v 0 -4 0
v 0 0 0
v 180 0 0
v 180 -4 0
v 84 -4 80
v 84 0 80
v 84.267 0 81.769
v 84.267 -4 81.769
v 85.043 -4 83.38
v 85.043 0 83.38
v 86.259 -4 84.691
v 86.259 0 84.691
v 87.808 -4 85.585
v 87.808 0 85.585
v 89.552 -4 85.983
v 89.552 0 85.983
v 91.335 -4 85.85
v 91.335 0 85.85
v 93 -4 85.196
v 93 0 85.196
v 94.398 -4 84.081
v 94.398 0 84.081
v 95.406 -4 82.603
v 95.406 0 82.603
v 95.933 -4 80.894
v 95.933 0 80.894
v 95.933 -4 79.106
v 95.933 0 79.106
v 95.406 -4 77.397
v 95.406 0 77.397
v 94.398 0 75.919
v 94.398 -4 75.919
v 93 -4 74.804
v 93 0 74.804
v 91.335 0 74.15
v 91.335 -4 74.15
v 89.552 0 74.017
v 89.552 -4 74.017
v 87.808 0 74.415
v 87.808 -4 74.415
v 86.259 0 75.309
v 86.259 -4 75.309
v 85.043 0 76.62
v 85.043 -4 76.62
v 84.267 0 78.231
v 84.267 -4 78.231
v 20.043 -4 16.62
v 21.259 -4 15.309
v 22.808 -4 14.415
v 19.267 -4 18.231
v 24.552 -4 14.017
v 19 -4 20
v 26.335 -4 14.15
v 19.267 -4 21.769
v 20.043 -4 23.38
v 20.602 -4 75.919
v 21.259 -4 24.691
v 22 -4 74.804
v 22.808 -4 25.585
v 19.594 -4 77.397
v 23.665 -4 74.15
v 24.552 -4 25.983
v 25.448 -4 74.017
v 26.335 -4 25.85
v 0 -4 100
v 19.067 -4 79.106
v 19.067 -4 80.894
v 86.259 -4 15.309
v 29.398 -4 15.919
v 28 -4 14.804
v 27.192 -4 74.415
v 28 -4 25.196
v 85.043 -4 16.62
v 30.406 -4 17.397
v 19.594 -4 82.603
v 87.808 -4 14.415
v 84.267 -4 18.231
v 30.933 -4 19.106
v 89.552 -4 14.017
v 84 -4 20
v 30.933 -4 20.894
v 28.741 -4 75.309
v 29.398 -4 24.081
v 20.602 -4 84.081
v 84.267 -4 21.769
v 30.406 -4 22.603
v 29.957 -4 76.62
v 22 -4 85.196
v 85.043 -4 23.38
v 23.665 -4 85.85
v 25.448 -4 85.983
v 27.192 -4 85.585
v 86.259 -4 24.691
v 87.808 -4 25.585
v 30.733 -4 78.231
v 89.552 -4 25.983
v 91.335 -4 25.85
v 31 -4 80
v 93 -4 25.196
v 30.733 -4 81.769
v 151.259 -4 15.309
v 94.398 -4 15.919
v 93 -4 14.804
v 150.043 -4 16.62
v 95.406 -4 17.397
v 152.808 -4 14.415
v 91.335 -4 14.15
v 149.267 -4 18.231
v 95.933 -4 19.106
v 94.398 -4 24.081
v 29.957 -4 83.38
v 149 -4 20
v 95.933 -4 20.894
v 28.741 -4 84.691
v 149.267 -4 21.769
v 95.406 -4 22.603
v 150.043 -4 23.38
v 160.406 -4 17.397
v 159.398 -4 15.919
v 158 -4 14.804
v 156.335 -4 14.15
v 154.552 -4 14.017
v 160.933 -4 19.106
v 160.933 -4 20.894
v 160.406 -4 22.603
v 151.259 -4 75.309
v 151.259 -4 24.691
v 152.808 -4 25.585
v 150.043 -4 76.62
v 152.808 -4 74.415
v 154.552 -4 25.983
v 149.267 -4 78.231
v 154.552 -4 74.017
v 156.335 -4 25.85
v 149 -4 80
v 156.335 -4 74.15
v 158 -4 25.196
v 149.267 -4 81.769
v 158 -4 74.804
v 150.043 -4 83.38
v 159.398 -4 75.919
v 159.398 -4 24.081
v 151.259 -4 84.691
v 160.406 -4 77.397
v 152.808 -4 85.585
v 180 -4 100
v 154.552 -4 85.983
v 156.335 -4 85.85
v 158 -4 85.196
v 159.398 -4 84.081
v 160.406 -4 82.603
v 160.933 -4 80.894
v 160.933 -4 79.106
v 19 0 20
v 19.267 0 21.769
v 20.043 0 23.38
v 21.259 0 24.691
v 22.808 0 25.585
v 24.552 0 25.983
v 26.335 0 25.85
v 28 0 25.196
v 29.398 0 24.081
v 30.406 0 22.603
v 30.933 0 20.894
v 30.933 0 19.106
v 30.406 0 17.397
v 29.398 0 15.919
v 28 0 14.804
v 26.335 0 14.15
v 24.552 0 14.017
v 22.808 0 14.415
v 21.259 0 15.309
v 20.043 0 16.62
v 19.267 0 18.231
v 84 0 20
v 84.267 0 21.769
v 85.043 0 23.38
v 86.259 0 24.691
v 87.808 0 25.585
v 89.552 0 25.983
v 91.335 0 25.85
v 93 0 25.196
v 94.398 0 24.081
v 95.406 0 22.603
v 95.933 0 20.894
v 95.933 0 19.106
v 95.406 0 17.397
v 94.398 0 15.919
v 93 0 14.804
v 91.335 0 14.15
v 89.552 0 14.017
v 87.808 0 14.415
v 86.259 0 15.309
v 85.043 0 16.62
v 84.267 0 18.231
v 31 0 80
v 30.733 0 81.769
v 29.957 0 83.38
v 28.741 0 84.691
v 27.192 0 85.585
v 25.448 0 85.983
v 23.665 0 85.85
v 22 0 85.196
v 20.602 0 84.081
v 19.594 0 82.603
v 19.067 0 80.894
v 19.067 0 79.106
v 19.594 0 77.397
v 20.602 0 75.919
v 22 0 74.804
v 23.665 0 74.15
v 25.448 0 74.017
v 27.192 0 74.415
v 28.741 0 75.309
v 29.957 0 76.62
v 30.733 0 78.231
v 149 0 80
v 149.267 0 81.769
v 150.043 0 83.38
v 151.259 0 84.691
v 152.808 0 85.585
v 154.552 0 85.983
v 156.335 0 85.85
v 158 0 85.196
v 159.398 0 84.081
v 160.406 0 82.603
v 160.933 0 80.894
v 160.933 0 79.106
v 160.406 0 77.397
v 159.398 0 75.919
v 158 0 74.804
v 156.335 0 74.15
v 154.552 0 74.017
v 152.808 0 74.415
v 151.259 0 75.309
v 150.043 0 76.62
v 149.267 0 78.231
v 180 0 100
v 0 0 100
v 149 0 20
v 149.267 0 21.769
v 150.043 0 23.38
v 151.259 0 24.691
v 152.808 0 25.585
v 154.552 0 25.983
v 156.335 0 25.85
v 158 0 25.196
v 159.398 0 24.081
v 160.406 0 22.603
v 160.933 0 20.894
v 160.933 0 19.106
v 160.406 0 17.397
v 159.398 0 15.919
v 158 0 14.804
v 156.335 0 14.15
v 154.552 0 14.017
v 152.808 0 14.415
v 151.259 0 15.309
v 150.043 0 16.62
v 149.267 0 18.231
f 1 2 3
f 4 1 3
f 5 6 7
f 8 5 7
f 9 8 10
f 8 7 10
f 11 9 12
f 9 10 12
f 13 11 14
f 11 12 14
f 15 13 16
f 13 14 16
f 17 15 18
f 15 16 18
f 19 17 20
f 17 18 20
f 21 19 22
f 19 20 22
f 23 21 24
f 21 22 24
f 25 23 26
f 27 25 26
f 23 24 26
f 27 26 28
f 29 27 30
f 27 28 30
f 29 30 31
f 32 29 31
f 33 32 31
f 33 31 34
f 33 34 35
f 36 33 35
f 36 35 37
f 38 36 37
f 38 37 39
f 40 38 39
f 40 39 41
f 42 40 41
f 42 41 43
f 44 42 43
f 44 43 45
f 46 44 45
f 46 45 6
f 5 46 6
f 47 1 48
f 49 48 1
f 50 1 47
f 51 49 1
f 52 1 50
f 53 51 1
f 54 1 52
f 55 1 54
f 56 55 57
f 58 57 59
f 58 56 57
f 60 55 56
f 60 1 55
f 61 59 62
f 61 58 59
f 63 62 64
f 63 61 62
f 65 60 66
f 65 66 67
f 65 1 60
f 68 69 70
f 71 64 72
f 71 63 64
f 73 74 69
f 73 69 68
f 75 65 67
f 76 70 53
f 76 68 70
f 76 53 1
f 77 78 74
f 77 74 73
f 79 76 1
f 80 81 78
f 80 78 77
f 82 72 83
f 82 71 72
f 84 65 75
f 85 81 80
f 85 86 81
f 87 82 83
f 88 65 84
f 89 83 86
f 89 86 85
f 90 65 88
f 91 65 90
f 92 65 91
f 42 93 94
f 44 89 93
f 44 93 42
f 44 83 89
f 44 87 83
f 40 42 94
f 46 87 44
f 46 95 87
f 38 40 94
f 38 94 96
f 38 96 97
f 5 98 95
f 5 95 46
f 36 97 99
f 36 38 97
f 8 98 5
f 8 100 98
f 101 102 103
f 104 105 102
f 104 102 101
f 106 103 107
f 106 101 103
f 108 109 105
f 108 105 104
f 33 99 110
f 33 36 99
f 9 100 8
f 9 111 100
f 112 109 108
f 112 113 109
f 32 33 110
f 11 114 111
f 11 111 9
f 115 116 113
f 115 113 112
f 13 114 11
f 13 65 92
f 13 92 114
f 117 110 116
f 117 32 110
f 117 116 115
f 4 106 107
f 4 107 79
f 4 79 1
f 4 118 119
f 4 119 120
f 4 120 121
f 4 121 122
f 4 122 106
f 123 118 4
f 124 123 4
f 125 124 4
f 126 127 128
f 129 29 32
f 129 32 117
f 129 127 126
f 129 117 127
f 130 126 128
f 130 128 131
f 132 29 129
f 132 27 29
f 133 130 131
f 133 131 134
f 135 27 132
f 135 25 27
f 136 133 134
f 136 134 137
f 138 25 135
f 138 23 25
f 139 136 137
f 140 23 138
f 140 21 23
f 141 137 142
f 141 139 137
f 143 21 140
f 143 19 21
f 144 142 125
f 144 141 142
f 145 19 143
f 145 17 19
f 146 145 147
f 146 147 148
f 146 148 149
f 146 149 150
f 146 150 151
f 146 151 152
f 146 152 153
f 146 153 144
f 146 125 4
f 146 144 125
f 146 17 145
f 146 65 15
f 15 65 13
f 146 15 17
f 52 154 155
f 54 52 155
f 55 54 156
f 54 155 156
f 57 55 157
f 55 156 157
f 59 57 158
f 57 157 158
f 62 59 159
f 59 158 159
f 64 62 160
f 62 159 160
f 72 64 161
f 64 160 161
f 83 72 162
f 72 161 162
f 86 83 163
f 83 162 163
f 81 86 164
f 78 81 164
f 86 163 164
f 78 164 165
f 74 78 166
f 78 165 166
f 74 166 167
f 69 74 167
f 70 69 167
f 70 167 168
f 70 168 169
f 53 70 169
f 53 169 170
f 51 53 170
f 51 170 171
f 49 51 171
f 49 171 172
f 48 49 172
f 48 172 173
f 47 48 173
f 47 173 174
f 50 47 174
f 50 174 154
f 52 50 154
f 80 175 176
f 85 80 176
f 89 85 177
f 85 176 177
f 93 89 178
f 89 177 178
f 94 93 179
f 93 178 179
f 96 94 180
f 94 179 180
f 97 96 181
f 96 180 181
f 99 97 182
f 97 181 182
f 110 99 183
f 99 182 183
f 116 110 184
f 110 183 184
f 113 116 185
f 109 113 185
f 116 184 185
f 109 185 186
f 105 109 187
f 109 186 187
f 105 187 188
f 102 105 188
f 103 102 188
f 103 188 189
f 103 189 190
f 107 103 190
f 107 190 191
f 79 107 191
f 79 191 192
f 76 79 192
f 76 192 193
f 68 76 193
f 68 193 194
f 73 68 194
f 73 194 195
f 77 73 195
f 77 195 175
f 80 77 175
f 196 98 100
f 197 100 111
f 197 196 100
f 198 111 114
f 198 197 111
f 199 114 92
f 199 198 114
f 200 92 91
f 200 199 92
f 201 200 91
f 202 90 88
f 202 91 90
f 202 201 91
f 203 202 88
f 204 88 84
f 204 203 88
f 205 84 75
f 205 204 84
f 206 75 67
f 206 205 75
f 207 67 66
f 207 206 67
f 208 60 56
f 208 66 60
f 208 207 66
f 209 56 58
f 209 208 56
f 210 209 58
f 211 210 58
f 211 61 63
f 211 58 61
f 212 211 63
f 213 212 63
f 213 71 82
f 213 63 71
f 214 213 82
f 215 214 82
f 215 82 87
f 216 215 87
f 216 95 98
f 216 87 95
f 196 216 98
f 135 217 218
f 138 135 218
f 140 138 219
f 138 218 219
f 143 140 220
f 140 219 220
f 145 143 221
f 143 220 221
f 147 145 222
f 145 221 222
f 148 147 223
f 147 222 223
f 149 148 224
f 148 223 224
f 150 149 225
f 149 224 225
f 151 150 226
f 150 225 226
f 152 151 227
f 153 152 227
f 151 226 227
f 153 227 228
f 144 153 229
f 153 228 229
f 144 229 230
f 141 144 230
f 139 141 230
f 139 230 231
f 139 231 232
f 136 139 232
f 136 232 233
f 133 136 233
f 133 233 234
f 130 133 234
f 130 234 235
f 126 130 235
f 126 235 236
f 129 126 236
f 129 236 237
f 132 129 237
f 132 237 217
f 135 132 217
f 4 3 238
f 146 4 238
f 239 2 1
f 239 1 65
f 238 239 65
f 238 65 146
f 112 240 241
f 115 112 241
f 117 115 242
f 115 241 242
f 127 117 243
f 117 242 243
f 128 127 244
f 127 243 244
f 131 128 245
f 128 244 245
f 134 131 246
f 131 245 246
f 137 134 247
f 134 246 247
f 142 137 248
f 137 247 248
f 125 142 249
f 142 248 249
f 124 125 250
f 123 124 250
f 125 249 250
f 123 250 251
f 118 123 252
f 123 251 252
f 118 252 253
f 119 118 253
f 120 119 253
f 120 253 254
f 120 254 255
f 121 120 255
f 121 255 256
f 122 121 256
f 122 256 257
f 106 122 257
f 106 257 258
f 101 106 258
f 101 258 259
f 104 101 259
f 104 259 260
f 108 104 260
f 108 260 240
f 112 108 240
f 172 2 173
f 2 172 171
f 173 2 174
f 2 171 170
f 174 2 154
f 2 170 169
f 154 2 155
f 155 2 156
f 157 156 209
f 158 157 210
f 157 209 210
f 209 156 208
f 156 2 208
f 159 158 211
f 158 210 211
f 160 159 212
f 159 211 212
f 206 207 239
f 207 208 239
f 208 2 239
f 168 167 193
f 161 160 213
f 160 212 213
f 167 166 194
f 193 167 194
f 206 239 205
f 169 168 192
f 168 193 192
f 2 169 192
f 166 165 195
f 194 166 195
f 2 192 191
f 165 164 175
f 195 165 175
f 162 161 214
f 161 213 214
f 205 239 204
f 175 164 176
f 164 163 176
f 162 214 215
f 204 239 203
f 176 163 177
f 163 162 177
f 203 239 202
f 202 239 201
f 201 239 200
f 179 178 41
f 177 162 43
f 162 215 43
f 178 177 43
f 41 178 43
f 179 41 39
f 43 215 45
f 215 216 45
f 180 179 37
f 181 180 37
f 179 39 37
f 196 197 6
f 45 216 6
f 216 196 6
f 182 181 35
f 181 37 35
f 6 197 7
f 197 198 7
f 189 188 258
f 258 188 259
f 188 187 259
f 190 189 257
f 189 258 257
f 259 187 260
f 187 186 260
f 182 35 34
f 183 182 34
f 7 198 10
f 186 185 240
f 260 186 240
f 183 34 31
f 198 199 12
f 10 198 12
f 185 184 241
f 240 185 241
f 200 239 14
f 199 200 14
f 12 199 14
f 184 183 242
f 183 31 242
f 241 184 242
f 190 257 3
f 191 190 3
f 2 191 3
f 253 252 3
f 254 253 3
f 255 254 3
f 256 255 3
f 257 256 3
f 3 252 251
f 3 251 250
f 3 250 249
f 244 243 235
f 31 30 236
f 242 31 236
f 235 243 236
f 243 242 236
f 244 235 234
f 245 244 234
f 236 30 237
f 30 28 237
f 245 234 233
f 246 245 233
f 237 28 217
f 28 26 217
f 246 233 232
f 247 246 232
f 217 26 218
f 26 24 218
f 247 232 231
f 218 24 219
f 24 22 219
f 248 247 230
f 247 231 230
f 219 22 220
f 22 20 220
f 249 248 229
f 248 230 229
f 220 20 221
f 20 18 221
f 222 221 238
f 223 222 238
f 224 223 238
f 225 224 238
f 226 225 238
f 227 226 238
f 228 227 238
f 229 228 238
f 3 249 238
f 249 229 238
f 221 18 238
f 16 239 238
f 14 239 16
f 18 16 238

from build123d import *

# Parameters (mm, degrees)
F0_W     = 180
F0_H     = 100
F1_DEPTH = 4
F2_R     = 6
F3_R     = 6
F4_DEPTH = 100


with BuildPart() as f1:
    # F0 (on Front) → F1 (new body)
    with BuildSketch(Plane.XZ):
        with Locations((90, 50)):
            Rectangle(F0_W, F0_H)
    extrude(amount=F1_DEPTH)

    # F2 (on Front) + F3 (on face) → F4 (cut)
    with BuildSketch(Plane.XZ):
        with Locations((25, 80)):
            Circle(F2_R)
    with BuildSketch(Plane(origin=(0, 0, 0), x_dir=(-1, 0, 0), z_dir=(0, 1, 0))):
        with Locations((-155, 20)):
            Circle(F3_R)
        with Locations((-155, 80)):
            Circle(F3_R)
        with Locations((-25, 20)):
            Circle(F3_R)
        with Locations((-90, 80)):
            Circle(F3_R)
        with Locations((-90, 20)):
            Circle(F3_R)
    extrude(amount=F4_DEPTH, dir=(0, -1, 0), mode=Mode.SUBTRACT)


solid = f1.part
